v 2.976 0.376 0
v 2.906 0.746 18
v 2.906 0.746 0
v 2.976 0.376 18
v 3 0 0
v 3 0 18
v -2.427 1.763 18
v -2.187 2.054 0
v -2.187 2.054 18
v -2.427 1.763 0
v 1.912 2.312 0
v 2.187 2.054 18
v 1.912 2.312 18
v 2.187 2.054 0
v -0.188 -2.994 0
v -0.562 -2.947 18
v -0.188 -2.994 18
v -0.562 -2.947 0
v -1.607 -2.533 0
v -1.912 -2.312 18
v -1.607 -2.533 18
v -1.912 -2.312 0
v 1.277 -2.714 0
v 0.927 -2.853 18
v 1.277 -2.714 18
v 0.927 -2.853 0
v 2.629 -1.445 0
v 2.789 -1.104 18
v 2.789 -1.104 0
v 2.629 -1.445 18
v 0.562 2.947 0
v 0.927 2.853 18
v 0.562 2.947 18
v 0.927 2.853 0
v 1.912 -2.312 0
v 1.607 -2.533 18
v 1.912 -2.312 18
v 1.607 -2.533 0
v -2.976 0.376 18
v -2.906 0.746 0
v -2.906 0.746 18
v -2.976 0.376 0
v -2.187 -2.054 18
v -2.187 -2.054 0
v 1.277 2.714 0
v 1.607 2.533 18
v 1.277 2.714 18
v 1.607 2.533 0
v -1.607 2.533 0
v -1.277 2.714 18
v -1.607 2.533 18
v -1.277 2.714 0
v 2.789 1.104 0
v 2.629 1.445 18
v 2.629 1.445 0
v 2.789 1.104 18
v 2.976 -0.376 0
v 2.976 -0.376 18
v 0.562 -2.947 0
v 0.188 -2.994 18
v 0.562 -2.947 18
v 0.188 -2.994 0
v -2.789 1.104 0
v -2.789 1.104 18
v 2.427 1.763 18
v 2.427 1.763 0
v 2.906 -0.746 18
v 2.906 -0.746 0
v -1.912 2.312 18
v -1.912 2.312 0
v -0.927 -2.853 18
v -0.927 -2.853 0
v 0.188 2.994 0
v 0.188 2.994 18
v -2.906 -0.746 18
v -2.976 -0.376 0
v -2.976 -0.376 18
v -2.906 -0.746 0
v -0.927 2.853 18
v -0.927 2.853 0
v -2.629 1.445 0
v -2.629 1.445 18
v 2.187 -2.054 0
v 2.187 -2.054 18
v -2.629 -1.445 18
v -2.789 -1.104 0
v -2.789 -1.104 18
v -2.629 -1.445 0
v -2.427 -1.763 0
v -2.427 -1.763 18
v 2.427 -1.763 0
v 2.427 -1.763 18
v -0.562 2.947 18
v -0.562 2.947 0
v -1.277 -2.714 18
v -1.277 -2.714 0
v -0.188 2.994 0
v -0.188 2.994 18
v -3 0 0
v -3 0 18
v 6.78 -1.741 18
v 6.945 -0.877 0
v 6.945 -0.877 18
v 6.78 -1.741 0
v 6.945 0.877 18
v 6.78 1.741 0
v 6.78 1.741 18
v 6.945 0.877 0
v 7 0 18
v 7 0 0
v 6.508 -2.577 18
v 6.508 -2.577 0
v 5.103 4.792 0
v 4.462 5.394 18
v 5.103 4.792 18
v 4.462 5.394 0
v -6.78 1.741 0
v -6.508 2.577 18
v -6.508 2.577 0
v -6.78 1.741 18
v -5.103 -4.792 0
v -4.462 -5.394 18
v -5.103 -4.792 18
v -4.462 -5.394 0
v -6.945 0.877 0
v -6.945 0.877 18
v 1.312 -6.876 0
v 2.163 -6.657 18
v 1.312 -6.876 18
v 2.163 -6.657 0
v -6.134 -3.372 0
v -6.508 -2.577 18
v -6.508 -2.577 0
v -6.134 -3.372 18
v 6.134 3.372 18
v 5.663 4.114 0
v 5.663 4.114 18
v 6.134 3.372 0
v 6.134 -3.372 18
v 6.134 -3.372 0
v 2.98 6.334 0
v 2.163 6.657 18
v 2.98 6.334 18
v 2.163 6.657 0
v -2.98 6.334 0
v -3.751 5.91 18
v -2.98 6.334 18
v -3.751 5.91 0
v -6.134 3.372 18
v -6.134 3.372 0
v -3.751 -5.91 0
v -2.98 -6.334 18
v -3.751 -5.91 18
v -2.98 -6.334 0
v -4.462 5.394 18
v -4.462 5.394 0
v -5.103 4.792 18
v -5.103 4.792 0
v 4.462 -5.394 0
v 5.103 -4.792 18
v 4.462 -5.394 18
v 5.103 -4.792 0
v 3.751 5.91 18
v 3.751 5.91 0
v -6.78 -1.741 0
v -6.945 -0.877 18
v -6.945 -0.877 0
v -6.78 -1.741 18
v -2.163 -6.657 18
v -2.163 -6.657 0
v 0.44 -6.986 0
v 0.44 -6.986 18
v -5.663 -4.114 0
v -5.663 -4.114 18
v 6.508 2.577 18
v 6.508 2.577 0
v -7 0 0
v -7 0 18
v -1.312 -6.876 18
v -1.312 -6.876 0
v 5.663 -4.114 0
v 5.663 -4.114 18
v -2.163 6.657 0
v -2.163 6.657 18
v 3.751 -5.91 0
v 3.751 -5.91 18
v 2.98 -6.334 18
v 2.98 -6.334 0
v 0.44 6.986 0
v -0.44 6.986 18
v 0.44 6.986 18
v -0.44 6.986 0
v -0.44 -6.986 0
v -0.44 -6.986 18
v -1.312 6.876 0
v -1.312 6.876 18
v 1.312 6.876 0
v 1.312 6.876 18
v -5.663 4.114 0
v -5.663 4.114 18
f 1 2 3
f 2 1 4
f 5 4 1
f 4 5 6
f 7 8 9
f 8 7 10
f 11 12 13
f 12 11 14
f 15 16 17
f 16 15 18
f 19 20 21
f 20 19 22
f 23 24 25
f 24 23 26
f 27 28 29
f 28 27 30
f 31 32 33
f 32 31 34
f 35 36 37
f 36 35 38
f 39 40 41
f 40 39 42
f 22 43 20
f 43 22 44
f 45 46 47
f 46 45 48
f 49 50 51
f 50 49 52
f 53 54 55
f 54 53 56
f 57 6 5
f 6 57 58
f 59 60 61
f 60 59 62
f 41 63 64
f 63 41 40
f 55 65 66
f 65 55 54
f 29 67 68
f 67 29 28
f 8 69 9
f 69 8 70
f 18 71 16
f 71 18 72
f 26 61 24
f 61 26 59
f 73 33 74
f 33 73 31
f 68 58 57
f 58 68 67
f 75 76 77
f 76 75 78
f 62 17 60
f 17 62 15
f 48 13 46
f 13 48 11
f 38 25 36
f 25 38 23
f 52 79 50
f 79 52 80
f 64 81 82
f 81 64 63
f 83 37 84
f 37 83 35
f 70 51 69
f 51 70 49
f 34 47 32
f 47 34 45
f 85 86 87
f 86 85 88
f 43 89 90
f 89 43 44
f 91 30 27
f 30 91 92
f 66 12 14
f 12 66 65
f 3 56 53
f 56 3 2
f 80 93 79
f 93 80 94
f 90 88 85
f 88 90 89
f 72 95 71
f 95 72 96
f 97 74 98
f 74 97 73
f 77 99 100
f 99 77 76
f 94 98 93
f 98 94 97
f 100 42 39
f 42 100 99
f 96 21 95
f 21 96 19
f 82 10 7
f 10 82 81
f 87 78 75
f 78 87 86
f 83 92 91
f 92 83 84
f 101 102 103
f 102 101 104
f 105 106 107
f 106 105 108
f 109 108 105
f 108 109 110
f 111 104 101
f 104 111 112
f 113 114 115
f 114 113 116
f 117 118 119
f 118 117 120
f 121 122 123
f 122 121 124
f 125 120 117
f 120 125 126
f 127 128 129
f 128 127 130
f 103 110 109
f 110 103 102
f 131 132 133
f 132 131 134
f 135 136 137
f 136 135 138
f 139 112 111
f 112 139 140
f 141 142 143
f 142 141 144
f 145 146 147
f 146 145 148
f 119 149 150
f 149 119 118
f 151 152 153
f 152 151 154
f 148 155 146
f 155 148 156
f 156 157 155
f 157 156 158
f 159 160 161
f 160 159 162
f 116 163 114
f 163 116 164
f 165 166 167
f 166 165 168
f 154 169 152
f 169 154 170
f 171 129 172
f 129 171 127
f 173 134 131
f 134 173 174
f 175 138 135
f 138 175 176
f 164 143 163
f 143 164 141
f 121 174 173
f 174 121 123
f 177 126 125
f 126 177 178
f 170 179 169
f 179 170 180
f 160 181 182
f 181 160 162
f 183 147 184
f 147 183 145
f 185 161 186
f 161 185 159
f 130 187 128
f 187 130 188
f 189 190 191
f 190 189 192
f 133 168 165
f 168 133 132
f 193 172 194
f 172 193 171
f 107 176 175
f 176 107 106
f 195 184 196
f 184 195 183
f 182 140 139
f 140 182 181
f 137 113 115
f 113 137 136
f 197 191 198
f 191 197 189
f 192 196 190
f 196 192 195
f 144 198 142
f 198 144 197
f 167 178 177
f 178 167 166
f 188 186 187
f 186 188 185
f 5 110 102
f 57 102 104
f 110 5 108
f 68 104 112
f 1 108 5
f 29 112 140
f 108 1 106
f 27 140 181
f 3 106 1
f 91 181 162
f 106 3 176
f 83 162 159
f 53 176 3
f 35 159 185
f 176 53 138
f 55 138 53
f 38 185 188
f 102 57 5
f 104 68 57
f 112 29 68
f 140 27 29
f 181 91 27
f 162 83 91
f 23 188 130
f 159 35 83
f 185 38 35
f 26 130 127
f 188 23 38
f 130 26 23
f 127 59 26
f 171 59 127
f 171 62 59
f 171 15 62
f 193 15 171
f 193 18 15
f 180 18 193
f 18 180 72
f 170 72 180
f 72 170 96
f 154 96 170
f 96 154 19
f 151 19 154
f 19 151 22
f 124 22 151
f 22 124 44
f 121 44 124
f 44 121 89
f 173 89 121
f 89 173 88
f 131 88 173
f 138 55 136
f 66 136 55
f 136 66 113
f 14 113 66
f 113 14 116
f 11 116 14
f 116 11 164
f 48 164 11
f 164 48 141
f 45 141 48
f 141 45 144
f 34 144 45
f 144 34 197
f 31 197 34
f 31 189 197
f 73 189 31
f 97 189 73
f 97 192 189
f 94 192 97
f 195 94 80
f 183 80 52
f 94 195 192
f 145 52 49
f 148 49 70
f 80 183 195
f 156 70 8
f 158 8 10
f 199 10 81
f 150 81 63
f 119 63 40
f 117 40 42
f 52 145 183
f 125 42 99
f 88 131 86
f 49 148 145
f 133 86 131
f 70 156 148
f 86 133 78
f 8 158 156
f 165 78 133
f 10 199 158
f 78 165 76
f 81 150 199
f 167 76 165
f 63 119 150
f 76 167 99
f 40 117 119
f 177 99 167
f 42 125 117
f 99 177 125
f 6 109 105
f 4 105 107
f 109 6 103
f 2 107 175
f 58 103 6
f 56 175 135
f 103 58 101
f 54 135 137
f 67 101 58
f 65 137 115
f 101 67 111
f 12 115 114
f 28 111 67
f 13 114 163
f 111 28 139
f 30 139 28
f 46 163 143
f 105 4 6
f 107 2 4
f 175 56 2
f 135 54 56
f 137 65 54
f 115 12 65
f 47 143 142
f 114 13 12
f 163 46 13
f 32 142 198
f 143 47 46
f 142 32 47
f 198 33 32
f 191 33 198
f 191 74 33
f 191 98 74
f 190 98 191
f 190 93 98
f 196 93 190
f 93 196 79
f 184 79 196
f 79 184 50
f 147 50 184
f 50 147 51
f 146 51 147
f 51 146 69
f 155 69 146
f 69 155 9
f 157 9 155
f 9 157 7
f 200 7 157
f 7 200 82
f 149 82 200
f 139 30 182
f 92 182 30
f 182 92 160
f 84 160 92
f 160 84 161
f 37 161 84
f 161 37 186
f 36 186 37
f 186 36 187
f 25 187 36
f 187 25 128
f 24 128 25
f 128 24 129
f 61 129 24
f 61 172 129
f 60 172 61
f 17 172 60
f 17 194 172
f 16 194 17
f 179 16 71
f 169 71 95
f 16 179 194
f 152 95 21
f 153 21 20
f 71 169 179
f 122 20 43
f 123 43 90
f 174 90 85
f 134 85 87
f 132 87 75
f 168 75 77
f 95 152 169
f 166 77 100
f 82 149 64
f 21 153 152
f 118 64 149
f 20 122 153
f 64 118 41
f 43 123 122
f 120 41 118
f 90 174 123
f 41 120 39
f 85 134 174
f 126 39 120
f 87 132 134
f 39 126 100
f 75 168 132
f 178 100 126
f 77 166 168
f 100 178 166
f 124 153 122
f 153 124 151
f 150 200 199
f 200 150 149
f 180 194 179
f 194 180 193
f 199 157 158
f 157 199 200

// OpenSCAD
$fn = 50;


difference() {
	union() {
		cylinder(h = 18, r = 7.0000000000);
	}
	union() {
		translate(v = [0.0000000000, 0.0000000000, -100.0000000000]) {
			cylinder(h = 200, r = 3.0000000000);
		}
		translate(v = [0.0000000000, 0.0000000000, -100.0000000000]) {
			cylinder(h = 200, r = 3.0000000000);
		}
		translate(v = [0.0000000000, 0.0000000000, -100.0000000000]) {
			cylinder(h = 200, r = 3.0000000000);
		}
		translate(v = [0.0000000000, 0.0000000000, -100.0000000000]) {
			cylinder(h = 200, r = 3.0000000000);
		}
	}
}
